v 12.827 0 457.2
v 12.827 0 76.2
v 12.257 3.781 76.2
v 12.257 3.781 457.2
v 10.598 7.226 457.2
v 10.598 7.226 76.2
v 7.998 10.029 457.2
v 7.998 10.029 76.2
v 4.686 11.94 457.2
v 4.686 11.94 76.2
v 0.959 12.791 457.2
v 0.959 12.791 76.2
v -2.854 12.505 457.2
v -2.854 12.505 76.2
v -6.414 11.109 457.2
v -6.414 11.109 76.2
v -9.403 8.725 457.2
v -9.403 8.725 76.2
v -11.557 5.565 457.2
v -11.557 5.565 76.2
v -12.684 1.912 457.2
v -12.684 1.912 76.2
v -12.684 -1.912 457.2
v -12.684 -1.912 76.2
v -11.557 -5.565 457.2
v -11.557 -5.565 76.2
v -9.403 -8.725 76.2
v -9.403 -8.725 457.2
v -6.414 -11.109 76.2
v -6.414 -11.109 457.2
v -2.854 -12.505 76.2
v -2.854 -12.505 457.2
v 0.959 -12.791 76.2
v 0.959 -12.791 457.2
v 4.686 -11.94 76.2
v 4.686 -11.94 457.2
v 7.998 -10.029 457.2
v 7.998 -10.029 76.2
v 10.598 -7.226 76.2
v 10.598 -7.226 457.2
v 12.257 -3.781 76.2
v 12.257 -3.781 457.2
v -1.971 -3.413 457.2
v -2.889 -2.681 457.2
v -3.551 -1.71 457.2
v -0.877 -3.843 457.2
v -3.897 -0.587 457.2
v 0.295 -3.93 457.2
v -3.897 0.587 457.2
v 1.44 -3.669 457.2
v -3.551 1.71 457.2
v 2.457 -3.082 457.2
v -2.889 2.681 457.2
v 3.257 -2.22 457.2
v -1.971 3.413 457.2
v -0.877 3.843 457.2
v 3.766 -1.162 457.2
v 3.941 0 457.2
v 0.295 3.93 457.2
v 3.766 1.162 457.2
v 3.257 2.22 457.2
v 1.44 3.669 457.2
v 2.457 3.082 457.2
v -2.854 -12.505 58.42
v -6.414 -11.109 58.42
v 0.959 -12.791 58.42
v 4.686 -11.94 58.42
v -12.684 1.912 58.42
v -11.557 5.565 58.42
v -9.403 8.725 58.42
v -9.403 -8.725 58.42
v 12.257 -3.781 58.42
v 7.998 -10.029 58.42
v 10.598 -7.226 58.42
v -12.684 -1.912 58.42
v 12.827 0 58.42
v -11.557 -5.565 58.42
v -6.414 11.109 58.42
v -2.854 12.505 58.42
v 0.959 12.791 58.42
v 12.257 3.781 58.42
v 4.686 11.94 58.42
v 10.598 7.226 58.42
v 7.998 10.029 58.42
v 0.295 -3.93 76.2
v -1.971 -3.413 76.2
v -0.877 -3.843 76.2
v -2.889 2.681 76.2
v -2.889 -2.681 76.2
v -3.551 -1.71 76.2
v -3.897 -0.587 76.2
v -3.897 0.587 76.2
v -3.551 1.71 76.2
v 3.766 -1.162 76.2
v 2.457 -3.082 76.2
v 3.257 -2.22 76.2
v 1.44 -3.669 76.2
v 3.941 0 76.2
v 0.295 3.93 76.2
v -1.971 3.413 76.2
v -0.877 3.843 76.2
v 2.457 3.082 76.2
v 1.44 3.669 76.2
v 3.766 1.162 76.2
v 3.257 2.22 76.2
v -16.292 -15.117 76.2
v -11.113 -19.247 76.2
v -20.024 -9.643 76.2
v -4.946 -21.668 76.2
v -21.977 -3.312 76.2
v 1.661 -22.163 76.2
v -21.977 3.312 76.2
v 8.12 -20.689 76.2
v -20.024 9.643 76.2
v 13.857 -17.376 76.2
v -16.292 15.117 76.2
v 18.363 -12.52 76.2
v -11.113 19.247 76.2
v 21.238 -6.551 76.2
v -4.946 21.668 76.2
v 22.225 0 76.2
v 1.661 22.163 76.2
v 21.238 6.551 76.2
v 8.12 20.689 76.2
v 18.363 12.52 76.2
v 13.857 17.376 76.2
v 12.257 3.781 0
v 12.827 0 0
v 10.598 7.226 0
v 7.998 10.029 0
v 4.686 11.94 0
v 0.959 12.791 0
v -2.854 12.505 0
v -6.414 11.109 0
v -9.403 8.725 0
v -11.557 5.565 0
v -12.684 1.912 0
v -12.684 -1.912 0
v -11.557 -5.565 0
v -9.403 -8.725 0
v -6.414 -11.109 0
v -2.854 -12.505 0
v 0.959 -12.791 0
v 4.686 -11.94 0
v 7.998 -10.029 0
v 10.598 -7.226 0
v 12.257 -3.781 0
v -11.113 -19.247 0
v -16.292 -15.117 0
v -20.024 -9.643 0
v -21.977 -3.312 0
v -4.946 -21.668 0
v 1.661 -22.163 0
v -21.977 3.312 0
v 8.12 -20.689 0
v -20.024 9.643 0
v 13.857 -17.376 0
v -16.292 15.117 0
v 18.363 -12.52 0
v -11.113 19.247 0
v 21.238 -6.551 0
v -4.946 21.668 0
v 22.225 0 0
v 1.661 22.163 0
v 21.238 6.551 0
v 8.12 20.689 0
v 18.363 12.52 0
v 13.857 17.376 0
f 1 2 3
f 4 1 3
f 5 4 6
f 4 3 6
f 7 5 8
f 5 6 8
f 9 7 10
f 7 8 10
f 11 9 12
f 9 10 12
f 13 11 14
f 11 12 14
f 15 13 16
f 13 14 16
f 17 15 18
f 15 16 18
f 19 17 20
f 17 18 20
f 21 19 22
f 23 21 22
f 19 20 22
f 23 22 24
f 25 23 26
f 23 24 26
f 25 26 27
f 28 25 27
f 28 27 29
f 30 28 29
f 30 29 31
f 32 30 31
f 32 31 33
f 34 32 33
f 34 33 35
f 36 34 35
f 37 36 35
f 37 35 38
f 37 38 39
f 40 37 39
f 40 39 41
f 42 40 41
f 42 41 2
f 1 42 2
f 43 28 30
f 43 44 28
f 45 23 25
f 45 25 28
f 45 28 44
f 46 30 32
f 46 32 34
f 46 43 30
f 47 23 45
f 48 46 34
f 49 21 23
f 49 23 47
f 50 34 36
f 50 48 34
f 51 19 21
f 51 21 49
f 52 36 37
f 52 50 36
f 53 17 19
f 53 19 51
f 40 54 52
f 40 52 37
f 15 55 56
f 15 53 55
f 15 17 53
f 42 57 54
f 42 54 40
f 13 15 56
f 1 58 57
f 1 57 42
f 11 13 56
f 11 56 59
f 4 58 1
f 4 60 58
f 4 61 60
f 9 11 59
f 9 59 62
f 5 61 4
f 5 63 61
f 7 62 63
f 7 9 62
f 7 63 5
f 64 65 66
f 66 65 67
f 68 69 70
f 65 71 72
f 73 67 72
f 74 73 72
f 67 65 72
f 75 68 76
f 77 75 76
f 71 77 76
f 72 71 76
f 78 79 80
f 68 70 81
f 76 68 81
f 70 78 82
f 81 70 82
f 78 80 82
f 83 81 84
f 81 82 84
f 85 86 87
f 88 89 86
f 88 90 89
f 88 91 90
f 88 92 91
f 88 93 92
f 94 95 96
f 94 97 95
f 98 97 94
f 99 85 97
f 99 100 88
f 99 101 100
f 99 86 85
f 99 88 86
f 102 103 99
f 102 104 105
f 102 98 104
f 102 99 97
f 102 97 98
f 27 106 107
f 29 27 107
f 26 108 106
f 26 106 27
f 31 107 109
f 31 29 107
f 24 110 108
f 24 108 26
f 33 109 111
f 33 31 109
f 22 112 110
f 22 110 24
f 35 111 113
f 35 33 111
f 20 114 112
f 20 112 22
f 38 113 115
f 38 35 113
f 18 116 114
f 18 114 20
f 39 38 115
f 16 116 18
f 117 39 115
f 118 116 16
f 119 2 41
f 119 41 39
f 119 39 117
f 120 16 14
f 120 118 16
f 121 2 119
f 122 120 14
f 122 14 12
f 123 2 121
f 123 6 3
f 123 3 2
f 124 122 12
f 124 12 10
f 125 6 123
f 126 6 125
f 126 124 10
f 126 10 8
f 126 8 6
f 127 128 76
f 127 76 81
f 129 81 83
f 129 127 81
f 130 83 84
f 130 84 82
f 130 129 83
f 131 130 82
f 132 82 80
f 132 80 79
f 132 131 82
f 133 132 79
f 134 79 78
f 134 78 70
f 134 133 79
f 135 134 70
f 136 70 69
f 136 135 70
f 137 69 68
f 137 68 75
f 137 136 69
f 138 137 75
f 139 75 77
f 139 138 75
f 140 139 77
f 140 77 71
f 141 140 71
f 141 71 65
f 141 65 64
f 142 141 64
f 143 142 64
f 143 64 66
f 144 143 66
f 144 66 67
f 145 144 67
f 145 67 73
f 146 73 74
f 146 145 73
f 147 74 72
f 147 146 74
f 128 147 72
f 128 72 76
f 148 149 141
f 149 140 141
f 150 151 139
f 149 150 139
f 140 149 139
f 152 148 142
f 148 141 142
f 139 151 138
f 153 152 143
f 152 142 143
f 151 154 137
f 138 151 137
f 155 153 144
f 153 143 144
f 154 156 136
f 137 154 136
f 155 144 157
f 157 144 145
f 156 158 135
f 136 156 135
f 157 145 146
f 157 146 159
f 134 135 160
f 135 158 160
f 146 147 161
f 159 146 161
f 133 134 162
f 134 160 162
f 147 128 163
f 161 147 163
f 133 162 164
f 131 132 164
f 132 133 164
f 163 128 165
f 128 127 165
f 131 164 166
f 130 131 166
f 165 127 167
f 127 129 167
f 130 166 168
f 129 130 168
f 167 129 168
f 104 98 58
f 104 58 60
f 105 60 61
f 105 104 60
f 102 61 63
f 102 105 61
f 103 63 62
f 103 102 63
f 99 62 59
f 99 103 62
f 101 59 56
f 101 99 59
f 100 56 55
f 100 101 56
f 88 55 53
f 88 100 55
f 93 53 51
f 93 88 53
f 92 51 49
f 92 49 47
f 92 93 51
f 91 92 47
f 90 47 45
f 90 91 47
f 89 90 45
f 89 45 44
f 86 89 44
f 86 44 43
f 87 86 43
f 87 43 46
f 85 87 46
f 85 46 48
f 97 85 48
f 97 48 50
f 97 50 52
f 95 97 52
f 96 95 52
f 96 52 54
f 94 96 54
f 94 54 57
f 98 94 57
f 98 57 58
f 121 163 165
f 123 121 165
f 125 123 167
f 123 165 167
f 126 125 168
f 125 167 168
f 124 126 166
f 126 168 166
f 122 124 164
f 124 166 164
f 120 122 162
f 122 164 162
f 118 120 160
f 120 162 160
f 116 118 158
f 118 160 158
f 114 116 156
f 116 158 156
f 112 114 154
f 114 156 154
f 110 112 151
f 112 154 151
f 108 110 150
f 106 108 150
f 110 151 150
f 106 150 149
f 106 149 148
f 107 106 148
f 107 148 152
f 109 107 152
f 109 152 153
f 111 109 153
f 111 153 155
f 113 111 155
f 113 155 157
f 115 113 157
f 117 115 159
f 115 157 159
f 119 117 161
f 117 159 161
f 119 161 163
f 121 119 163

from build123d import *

# Parameters (mm, degrees)
F0_R     = 22.225
F0_R_2   = 12.827
F0_R_3   = 3.9414525169
F1_DEPTH = 76.2
F2_DEPTH = 58.42
F3_START = 71.628
F3_DEPTH = 385.572


with BuildPart() as f1:
    # F0 (on Top) → F1 (new body)
    with BuildSketch(Plane.XY):
        Circle(F0_R)
        Circle(F0_R_2, mode=Mode.SUBTRACT)
        Circle(F0_R_2)
        Circle(F0_R_3, mode=Mode.SUBTRACT)
        Circle(F0_R_3)
    extrude(amount=F1_DEPTH)

    # F0 (on Top) → F2 (cut)
    with BuildSketch(Plane.XY):
        Circle(F0_R_2)
        Circle(F0_R_3, mode=Mode.SUBTRACT)
        Circle(F0_R_3)
    extrude(amount=F2_DEPTH, mode=Mode.SUBTRACT)

    # F0 (on Top) → F3 (join)
    with BuildSketch(Plane.XY.offset(F3_START)):
        Circle(F0_R_2)
        Circle(F0_R_3, mode=Mode.SUBTRACT)
    extrude(amount=F3_DEPTH)


solid = f1.part
